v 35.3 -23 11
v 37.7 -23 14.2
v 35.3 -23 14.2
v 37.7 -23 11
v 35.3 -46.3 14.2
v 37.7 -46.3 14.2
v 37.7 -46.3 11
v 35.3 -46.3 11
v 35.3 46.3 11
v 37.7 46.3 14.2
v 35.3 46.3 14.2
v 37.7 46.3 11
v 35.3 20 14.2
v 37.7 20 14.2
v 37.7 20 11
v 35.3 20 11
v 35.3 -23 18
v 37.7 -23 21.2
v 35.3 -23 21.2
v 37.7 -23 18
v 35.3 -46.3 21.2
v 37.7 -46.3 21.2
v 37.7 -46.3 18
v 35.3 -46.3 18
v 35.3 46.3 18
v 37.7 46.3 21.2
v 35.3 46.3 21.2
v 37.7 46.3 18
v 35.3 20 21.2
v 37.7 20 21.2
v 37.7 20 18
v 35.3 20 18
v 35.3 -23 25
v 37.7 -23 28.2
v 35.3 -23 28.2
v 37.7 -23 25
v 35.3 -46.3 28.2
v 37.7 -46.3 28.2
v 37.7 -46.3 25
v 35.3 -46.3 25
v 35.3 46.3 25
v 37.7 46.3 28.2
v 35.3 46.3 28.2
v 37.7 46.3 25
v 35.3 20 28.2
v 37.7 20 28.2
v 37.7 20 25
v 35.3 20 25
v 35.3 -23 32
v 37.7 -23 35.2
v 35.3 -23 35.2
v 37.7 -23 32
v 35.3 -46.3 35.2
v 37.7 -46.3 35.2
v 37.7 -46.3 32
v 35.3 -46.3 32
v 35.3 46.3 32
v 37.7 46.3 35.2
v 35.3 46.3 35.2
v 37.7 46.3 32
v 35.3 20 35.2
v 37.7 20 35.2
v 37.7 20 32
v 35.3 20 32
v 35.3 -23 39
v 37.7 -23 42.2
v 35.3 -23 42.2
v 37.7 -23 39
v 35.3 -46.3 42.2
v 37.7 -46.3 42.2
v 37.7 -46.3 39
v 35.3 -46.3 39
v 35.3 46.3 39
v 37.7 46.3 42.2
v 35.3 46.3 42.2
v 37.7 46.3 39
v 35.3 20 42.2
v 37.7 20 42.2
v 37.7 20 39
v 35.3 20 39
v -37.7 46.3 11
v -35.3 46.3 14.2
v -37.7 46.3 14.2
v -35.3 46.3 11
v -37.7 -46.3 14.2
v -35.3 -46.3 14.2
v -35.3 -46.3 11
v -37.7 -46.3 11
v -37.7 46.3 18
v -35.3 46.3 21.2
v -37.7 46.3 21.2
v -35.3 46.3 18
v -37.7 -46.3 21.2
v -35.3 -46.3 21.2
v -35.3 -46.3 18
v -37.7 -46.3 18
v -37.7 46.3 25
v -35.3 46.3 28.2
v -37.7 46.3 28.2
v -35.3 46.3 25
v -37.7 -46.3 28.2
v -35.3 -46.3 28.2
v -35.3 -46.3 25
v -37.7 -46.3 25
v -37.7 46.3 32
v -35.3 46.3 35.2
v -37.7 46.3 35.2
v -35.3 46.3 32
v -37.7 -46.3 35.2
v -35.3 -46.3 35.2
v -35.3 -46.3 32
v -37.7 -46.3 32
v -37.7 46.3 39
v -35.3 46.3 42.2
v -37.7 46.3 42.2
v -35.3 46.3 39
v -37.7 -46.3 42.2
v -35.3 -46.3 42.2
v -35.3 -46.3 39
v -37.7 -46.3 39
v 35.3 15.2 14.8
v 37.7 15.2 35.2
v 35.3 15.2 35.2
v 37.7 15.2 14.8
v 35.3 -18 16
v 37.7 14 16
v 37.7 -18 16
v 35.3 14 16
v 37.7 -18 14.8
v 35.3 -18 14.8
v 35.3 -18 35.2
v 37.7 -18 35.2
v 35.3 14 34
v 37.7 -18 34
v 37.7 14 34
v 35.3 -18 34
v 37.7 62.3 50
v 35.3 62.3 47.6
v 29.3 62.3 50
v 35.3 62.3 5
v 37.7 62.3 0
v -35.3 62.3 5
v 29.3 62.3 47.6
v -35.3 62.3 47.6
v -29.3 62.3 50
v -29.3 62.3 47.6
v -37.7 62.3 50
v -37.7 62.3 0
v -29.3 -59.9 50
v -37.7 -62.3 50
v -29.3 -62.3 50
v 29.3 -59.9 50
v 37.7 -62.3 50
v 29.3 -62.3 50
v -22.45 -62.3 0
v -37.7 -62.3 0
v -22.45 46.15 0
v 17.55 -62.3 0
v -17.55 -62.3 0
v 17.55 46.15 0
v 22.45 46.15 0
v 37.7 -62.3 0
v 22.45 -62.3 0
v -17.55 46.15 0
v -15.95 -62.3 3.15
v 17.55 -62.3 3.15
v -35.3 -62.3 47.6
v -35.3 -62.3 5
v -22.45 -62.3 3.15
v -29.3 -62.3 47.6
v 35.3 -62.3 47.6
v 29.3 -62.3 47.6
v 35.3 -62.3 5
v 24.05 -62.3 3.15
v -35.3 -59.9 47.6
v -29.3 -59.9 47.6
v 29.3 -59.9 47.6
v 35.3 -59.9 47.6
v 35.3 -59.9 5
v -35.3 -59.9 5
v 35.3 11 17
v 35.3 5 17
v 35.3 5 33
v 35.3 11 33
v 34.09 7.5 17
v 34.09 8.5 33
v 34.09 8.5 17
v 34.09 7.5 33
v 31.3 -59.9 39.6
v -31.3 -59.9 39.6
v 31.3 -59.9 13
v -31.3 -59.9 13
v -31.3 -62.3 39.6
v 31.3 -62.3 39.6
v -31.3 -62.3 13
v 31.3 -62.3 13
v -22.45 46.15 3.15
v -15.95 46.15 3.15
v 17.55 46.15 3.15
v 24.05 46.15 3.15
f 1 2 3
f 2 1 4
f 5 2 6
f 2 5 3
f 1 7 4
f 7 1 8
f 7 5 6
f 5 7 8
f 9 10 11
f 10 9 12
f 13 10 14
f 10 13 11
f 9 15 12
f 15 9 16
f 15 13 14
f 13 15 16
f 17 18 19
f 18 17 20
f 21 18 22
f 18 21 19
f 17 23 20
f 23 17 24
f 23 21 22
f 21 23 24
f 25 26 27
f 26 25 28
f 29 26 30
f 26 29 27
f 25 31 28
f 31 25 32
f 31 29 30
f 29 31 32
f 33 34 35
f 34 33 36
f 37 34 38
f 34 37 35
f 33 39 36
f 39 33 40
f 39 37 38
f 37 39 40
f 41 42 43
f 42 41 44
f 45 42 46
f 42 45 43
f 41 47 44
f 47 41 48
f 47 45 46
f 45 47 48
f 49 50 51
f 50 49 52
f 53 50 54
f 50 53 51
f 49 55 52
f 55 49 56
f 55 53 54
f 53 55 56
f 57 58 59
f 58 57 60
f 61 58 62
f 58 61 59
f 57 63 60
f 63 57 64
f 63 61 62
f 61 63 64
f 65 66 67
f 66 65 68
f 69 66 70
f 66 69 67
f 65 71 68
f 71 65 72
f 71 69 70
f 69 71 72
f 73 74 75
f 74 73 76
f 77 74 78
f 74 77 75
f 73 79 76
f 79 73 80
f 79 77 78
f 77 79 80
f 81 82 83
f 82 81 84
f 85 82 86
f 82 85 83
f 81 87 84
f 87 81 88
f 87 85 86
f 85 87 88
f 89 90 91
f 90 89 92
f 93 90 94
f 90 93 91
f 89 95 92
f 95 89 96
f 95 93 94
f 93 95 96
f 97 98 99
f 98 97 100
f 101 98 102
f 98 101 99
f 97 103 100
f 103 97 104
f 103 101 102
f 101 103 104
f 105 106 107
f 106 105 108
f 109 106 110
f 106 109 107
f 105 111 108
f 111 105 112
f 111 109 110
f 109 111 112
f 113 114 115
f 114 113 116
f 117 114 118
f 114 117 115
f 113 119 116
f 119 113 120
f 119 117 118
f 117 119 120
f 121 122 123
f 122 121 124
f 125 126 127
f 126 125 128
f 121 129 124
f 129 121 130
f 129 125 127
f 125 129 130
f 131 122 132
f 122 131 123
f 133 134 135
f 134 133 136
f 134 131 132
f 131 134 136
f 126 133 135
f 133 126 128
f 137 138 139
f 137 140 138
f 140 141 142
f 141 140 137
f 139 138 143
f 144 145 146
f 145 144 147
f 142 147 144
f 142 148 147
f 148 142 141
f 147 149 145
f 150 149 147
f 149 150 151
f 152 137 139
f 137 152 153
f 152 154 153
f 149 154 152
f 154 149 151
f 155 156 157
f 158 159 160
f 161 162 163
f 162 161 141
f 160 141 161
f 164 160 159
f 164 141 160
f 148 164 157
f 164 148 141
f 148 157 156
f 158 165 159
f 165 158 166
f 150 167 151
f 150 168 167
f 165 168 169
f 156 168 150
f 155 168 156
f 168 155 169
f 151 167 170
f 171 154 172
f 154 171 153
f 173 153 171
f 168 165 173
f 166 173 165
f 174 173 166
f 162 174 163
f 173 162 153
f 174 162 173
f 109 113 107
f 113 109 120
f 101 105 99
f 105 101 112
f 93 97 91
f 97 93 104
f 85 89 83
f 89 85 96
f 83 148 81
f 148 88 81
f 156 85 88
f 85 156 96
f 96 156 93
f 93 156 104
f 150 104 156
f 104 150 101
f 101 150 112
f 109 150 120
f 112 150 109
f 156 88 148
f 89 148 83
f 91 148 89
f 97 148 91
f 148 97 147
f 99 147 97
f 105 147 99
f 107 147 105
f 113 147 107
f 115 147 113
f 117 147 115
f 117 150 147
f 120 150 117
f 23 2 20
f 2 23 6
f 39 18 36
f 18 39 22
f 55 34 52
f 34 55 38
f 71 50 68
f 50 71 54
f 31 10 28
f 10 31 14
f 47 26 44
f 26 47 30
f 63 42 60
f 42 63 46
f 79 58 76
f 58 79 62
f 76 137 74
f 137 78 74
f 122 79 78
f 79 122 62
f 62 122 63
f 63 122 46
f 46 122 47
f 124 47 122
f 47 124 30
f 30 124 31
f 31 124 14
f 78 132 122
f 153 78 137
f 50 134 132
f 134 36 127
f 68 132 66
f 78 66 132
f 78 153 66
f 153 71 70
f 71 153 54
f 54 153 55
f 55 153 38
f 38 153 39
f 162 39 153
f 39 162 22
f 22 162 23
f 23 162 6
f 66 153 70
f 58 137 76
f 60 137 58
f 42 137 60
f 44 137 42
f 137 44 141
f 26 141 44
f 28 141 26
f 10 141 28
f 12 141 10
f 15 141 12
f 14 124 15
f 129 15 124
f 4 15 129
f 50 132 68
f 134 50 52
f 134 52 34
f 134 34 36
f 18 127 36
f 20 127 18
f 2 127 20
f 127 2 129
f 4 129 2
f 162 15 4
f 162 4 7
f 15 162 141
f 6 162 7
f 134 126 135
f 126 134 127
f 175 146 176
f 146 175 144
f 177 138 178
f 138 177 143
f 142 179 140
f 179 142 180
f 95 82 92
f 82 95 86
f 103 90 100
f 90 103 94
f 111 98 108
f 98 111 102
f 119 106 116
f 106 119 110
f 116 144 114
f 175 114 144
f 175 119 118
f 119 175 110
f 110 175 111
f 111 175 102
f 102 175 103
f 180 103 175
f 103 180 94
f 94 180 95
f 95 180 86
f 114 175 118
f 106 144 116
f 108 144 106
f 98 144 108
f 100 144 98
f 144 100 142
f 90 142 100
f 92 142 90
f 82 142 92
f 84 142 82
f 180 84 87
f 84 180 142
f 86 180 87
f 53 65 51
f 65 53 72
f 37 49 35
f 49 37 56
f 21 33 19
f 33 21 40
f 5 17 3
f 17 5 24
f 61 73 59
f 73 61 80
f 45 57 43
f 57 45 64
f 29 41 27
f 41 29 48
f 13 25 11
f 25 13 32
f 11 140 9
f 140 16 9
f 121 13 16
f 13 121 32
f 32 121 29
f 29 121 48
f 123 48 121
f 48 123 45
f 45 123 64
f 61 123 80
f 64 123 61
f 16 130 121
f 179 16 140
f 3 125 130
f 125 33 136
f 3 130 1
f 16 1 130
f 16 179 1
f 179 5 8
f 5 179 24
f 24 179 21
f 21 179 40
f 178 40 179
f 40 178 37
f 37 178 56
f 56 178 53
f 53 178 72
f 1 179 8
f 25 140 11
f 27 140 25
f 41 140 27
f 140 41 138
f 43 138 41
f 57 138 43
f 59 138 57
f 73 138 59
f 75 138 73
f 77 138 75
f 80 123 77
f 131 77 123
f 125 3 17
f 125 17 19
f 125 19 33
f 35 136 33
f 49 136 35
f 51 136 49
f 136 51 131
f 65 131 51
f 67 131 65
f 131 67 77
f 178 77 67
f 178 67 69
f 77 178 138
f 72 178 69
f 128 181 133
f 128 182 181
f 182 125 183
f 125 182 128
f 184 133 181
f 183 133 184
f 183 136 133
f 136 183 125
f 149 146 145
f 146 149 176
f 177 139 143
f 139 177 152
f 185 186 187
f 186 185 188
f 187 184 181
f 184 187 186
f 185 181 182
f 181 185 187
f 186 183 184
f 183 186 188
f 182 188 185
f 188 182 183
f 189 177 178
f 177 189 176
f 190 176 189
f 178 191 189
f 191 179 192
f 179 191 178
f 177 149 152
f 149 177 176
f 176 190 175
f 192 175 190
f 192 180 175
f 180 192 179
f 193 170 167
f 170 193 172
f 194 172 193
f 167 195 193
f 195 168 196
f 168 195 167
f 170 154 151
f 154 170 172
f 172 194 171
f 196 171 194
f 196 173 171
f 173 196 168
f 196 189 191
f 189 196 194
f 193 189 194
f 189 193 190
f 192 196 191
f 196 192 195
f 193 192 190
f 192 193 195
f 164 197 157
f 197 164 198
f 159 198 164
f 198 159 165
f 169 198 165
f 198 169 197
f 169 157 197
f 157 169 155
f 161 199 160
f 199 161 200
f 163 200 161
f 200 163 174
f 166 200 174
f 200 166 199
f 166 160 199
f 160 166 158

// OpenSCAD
// SKÅDIS holder for TP-Link Omada POE380S PoE++ injector
// Injector: 155 L x 70 x 42 mm (datasheet). Ports + LEDs on one end, AC socket on the other.
// Logo faces out. Four drop-lock hooks.
//
// orient = "landscape": injector lies along the board, slides in from either open end.
//   Print standing on an open end (hooks flush to the bed), supports on build plate only
//   (only the two hooks at the top end need them).
// orient = "portrait" (default): a pocket. The injector drops in from the open top and
//   sits on a floor frame, open in the middle so the plugs on the lower end come straight
//   out underneath; the spring tab holds it snug. print_ready = true lays it upside down
//   (open top on the bed) so the hook tabs grow up from their stems: no supports, just
//   one 70 mm bridge for the front strip of the floor.
// PETG, 0.2 mm, 4 walls, 25% gyroid.
//
// Axes: Y = up the board, Z = out from the board, X = across the board.
// The channel is modelled along X and turned upright for portrait.

orient = "portrait";    // "portrait" | "landscape"
print_ready = false;    // portrait only: flip upside down for printing

$fn = 32;

// --- injector ---
dev_d   = 70;      // vertical on the board
dev_h   = 42;      // depth out from the board
clr     = 0.6;     // total clearance on each cross-section dimension

// --- holder ---
len     = 124.6;   // hooks at both ends, 120 mm apart (3 x 40 mm SKÅDIS pitch)
wall    = 2.4;
back    = 5;      // 5 mm leaves ~1.8 mm behind the hook-bar dovetail grooves
lip     = 6;       // front retaining lip, top and bottom
lip_t   = 2.4;

in_y = dev_d + clr;            // 70.6
in_z = dev_h + clr;            // 42.6
out_y = in_y + 2*wall;         // 75.4
z_lip0 = back + in_z;          // front face of injector

// --- SKÅDIS: obround slots 5 x 15 mm (2.5 mm radius ends), board ~5 mm,
// columns 20 mm apart with alternate columns offset 20 mm, so slots in one
// row repeat every 40 mm and one column repeats every 40 mm vertically.
// Hook = drop-lock J: push the J straight in near the top of the slot, then
// let it drop 10 mm. The tab hangs down behind the board, below the slot.
// The board's slot edge meets the tab tip first as it drops, so the tab face
// ramps from a loose lead-in at the tip to a snug grip where the slot edge
// ends up: weight pulls the back plate tight to the board. A slightly thicker
// board just stops the drop a fraction early; it still locks.
hook_w   = 4.6;    // across the slot (slot is 5 wide)
stem_h   = 8;      // stem is a 4.6 x 8 pill, seats in the slot's round end
                   // (5 mm in the fit test; 8 mm after it, for ~2.5x bending strength)
gap_grip = 4.95;   // back plate -> tab face at the slot edge when seated (board 5.0)
gap_lead = 5.6;    // back plate -> tab face at the tab tip (lead-in)
tab_t    = 4;      // tab thickness behind the board (wall gap ~20 mm)
tab_len  = 12;     // from stem top down: 4 mm below the slot when seated,
                   // and stem + tab only 12 mm tall to pass a 15 mm slot
hook_y   = 20;     // stem centres at +/-hook_y: two slots 40 mm apart in one column

module c_channel() {
    difference() {
        translate([0, -out_y/2, 0]) cube([len, out_y, z_lip0 + lip_t]);
        // device cavity
        translate([-1, -in_y/2, back]) cube([len + 2, in_y, in_z]);
        // open front between the lips
        translate([-1, -in_y/2 + lip, back]) cube([len + 2, in_y - 2*lip, in_z + lip_t + 1]);
        vents();
        spring_cut();
    }
    spring_bump();
}

// vertical vent slots through top and bottom walls (vertical in print = clean)
// bottom wall skips the spring tab
module vents() {
    for (z = [back + 6 : 7 : z_lip0 - 5]) {
        translate([16, in_y/2 - 1, z]) cube([len - 32, wall + 2, 3.2]);
        for (r = [[16, spr_x0 - 5], [spr_x0 + spr_len + 6, len - 16]])
            translate([r[0], -out_y/2 - 1, z]) cube([r[1] - r[0], wall + 2, 3.2]);
    }
}

// sprung tab in the bottom wall pushes the injector up against the top wall
spr_x0 = len/2 - 18;  spr_len = 32;
spr_z0 = back + 11;   spr_wid = 18;
module spring_cut() {
    g = 1.2;
    translate([0, -out_y/2 - 1, 0]) {
        // two long sides + far end, root left attached at spr_x0
        translate([spr_x0, 0, spr_z0 - g]) cube([spr_len + g, wall + 2, g]);
        translate([spr_x0, 0, spr_z0 + spr_wid]) cube([spr_len + g, wall + 2, g]);
        translate([spr_x0 + spr_len, 0, spr_z0 - g]) cube([g, wall + 2, spr_wid + 2*g]);
    }
}
module spring_bump() {
    // 45° wedge, 1.2 mm proud, near the free end
    bx = spr_x0 + spr_len - 6;
    translate([0, -in_y/2, spr_z0 + 1])
        hull() {
            translate([bx - 3, -0.01, 0]) cube([6, 0.01, spr_wid - 2]);
            translate([bx - 0.5, 1.2, 0]) cube([1, 0.01, spr_wid - 2]);
        }
}

// 2D pill, x = across slot, y = up the slot, origin at the bottom of the pill
module pill(h) {
    r = hook_w/2;
    hull() { translate([0, r]) circle(r); translate([0, h - r]) circle(r); }
}

module hook() {   // on the back face (z <= 0), origin = stem bottom
    r = hook_w/2;
    translate([0, 0, -gap_grip]) linear_extrude(gap_grip + 0.01) pill(stem_h);
    hull() {
        translate([0, stem_h - r, -gap_grip - tab_t]) cylinder(r = r, h = tab_t);
        translate([-r, 0, -gap_grip - tab_t]) cube([hook_w, 0.01, tab_t]);
        translate([0, stem_h - tab_len + r, -gap_lead - tab_t]) cylinder(r = r, h = tab_t);
    }
}
// stem centres. Same-row slots repeat every 40 mm, a column every 40 mm.
// landscape: columns 120 mm apart at the holder ends, rows 40 mm apart
// portrait:  columns 40 mm apart, rows 80 mm apart
mount_pts = orient == "portrait"
    ? [for (x = [-20, 20], y = [40, -40]) [x, y]]
    : [for (x = [hook_w/2, len - hook_w/2], y = [hook_y, -hook_y]) [x, y]];

module mounts() {
    for (p = mount_pts) translate([p[0], p[1] - stem_h/2, 0]) hook();
}

// portrait: floor frame at the bottom end, window clear of the RJ45s / LEDs / AC plug
floor_side  = 4;   // across the 70 mm face
floor_frbk  = 8;   // back and front strips
module portrait_floor() {
    y0 = -len/2;
    difference() {
        translate([-out_y/2, y0, 0]) cube([out_y, wall, z_lip0 + lip_t]);
        translate([-in_y/2 + floor_side, y0 - 1, back + floor_frbk])
            cube([in_y - 2*floor_side, wall + 2, in_z - 2*floor_frbk]);
    }
}

// --- portrait: hooks on two separate bars that slide up dovetail grooves in the back ---
// Each bar carries one column's two hooks and prints lying on its flat side, so the
// hooks need no supports and their layers run along the hook outline. The bar slides
// in from the bottom of the pocket up to a stop; the load on the hooks pushes the
// bar against the stop. A drop of glue is optional.
dv_d     = 3;      // dovetail depth into the back plate
dv_flare = 1.6;    // undercut on one side only, so the bar's other side prints flat
dv_clr   = 0.15;   // clearance per side
bar_xs   = [-20, 20];
bar_top  = 40 + stem_h/2 + 2;   // groove stop, 2 mm above the upper stem
bar_bot  = -len/2;              // flush with the bottom of the pocket

module dovetail2d(c) {   // x across, y = depth into the back plate
    o = c > 0 ? 1 : 0;   // groove: run 1 mm out through the back face
    polygon([[-hook_w/2 - c, -o], [hook_w/2 + c, -o], [hook_w/2 + c, 0],
             [hook_w/2 + dv_flare + c, dv_d + c], [-hook_w/2 - c, dv_d + c]]);
}
module bar_body(c, y0, y1) translate([0, y1, 0]) rotate([90, 0, 0])
    linear_extrude(y1 - y0) dovetail2d(c);

module hook_bar() {      // one column, origin at its stem centreline
    bar_body(0, bar_bot, bar_top);
    for (y = [40, -40]) translate([0, y - stem_h/2, 0]) hook();
}

module holder() {
    if (orient == "portrait") {
        difference() {
            union() {
                translate([0, -len/2, 0]) rotate([0, 0, 90]) c_channel();
                portrait_floor();
            }
            for (x = bar_xs) translate([x, 0, 0])
                bar_body(dv_clr, bar_bot - 1, bar_top + dv_clr);
        }
    } else { c_channel(); mounts(); }
}
module assembled() { holder(); if (orient == "portrait") for (x = bar_xs) translate([x, 0, 0]) hook_bar(); }

// sizing test: a thin open frame carrying the same four hooks. Plate thickness doesn't
// change the fit, because the hooks are measured from the plate's back face.
test_t   = 2;    // frame thickness
test_bar = 10;   // frame bar width
module test_strip() {
    xs = [for (p = mount_pts) p[0]];  ys = [for (p = mount_pts) p[1]];
    x0 = min(xs) - 7;  x1 = max(xs) + 7;  y0 = min(ys) - 7;  y1 = max(ys) + 7;
    difference() {
        translate([x0, y0, 0]) cube([x1 - x0, y1 - y0, test_t]);
        translate([x0 + test_bar, y0 + test_bar, -1])
            cube([x1 - x0 - 2*test_bar, y1 - y0 - 2*test_bar, test_t + 2]);
    }
    mounts();
}

// part = "holder" for the real thing, "test" for a quick back-plate strip with the
// same four hooks to check the board fit before printing the whole holder
part = "holder";
module place(top) {   // top = highest Y of the part, lands on the bed
    if (print_ready && orient == "portrait")
        translate([0, 0, top]) rotate([-90, 0, 0]) children();
    else children();
}
if (part == "holder") place(len/2) holder();
// print 2 of these, flat side down
if (part == "bar") translate([0, 0, hook_w/2]) rotate([0, -90, 0]) hook_bar();
if (part == "assembled") assembled();
if (part == "test") place(max([for (p = mount_pts) p[1]]) + 7) test_strip();
